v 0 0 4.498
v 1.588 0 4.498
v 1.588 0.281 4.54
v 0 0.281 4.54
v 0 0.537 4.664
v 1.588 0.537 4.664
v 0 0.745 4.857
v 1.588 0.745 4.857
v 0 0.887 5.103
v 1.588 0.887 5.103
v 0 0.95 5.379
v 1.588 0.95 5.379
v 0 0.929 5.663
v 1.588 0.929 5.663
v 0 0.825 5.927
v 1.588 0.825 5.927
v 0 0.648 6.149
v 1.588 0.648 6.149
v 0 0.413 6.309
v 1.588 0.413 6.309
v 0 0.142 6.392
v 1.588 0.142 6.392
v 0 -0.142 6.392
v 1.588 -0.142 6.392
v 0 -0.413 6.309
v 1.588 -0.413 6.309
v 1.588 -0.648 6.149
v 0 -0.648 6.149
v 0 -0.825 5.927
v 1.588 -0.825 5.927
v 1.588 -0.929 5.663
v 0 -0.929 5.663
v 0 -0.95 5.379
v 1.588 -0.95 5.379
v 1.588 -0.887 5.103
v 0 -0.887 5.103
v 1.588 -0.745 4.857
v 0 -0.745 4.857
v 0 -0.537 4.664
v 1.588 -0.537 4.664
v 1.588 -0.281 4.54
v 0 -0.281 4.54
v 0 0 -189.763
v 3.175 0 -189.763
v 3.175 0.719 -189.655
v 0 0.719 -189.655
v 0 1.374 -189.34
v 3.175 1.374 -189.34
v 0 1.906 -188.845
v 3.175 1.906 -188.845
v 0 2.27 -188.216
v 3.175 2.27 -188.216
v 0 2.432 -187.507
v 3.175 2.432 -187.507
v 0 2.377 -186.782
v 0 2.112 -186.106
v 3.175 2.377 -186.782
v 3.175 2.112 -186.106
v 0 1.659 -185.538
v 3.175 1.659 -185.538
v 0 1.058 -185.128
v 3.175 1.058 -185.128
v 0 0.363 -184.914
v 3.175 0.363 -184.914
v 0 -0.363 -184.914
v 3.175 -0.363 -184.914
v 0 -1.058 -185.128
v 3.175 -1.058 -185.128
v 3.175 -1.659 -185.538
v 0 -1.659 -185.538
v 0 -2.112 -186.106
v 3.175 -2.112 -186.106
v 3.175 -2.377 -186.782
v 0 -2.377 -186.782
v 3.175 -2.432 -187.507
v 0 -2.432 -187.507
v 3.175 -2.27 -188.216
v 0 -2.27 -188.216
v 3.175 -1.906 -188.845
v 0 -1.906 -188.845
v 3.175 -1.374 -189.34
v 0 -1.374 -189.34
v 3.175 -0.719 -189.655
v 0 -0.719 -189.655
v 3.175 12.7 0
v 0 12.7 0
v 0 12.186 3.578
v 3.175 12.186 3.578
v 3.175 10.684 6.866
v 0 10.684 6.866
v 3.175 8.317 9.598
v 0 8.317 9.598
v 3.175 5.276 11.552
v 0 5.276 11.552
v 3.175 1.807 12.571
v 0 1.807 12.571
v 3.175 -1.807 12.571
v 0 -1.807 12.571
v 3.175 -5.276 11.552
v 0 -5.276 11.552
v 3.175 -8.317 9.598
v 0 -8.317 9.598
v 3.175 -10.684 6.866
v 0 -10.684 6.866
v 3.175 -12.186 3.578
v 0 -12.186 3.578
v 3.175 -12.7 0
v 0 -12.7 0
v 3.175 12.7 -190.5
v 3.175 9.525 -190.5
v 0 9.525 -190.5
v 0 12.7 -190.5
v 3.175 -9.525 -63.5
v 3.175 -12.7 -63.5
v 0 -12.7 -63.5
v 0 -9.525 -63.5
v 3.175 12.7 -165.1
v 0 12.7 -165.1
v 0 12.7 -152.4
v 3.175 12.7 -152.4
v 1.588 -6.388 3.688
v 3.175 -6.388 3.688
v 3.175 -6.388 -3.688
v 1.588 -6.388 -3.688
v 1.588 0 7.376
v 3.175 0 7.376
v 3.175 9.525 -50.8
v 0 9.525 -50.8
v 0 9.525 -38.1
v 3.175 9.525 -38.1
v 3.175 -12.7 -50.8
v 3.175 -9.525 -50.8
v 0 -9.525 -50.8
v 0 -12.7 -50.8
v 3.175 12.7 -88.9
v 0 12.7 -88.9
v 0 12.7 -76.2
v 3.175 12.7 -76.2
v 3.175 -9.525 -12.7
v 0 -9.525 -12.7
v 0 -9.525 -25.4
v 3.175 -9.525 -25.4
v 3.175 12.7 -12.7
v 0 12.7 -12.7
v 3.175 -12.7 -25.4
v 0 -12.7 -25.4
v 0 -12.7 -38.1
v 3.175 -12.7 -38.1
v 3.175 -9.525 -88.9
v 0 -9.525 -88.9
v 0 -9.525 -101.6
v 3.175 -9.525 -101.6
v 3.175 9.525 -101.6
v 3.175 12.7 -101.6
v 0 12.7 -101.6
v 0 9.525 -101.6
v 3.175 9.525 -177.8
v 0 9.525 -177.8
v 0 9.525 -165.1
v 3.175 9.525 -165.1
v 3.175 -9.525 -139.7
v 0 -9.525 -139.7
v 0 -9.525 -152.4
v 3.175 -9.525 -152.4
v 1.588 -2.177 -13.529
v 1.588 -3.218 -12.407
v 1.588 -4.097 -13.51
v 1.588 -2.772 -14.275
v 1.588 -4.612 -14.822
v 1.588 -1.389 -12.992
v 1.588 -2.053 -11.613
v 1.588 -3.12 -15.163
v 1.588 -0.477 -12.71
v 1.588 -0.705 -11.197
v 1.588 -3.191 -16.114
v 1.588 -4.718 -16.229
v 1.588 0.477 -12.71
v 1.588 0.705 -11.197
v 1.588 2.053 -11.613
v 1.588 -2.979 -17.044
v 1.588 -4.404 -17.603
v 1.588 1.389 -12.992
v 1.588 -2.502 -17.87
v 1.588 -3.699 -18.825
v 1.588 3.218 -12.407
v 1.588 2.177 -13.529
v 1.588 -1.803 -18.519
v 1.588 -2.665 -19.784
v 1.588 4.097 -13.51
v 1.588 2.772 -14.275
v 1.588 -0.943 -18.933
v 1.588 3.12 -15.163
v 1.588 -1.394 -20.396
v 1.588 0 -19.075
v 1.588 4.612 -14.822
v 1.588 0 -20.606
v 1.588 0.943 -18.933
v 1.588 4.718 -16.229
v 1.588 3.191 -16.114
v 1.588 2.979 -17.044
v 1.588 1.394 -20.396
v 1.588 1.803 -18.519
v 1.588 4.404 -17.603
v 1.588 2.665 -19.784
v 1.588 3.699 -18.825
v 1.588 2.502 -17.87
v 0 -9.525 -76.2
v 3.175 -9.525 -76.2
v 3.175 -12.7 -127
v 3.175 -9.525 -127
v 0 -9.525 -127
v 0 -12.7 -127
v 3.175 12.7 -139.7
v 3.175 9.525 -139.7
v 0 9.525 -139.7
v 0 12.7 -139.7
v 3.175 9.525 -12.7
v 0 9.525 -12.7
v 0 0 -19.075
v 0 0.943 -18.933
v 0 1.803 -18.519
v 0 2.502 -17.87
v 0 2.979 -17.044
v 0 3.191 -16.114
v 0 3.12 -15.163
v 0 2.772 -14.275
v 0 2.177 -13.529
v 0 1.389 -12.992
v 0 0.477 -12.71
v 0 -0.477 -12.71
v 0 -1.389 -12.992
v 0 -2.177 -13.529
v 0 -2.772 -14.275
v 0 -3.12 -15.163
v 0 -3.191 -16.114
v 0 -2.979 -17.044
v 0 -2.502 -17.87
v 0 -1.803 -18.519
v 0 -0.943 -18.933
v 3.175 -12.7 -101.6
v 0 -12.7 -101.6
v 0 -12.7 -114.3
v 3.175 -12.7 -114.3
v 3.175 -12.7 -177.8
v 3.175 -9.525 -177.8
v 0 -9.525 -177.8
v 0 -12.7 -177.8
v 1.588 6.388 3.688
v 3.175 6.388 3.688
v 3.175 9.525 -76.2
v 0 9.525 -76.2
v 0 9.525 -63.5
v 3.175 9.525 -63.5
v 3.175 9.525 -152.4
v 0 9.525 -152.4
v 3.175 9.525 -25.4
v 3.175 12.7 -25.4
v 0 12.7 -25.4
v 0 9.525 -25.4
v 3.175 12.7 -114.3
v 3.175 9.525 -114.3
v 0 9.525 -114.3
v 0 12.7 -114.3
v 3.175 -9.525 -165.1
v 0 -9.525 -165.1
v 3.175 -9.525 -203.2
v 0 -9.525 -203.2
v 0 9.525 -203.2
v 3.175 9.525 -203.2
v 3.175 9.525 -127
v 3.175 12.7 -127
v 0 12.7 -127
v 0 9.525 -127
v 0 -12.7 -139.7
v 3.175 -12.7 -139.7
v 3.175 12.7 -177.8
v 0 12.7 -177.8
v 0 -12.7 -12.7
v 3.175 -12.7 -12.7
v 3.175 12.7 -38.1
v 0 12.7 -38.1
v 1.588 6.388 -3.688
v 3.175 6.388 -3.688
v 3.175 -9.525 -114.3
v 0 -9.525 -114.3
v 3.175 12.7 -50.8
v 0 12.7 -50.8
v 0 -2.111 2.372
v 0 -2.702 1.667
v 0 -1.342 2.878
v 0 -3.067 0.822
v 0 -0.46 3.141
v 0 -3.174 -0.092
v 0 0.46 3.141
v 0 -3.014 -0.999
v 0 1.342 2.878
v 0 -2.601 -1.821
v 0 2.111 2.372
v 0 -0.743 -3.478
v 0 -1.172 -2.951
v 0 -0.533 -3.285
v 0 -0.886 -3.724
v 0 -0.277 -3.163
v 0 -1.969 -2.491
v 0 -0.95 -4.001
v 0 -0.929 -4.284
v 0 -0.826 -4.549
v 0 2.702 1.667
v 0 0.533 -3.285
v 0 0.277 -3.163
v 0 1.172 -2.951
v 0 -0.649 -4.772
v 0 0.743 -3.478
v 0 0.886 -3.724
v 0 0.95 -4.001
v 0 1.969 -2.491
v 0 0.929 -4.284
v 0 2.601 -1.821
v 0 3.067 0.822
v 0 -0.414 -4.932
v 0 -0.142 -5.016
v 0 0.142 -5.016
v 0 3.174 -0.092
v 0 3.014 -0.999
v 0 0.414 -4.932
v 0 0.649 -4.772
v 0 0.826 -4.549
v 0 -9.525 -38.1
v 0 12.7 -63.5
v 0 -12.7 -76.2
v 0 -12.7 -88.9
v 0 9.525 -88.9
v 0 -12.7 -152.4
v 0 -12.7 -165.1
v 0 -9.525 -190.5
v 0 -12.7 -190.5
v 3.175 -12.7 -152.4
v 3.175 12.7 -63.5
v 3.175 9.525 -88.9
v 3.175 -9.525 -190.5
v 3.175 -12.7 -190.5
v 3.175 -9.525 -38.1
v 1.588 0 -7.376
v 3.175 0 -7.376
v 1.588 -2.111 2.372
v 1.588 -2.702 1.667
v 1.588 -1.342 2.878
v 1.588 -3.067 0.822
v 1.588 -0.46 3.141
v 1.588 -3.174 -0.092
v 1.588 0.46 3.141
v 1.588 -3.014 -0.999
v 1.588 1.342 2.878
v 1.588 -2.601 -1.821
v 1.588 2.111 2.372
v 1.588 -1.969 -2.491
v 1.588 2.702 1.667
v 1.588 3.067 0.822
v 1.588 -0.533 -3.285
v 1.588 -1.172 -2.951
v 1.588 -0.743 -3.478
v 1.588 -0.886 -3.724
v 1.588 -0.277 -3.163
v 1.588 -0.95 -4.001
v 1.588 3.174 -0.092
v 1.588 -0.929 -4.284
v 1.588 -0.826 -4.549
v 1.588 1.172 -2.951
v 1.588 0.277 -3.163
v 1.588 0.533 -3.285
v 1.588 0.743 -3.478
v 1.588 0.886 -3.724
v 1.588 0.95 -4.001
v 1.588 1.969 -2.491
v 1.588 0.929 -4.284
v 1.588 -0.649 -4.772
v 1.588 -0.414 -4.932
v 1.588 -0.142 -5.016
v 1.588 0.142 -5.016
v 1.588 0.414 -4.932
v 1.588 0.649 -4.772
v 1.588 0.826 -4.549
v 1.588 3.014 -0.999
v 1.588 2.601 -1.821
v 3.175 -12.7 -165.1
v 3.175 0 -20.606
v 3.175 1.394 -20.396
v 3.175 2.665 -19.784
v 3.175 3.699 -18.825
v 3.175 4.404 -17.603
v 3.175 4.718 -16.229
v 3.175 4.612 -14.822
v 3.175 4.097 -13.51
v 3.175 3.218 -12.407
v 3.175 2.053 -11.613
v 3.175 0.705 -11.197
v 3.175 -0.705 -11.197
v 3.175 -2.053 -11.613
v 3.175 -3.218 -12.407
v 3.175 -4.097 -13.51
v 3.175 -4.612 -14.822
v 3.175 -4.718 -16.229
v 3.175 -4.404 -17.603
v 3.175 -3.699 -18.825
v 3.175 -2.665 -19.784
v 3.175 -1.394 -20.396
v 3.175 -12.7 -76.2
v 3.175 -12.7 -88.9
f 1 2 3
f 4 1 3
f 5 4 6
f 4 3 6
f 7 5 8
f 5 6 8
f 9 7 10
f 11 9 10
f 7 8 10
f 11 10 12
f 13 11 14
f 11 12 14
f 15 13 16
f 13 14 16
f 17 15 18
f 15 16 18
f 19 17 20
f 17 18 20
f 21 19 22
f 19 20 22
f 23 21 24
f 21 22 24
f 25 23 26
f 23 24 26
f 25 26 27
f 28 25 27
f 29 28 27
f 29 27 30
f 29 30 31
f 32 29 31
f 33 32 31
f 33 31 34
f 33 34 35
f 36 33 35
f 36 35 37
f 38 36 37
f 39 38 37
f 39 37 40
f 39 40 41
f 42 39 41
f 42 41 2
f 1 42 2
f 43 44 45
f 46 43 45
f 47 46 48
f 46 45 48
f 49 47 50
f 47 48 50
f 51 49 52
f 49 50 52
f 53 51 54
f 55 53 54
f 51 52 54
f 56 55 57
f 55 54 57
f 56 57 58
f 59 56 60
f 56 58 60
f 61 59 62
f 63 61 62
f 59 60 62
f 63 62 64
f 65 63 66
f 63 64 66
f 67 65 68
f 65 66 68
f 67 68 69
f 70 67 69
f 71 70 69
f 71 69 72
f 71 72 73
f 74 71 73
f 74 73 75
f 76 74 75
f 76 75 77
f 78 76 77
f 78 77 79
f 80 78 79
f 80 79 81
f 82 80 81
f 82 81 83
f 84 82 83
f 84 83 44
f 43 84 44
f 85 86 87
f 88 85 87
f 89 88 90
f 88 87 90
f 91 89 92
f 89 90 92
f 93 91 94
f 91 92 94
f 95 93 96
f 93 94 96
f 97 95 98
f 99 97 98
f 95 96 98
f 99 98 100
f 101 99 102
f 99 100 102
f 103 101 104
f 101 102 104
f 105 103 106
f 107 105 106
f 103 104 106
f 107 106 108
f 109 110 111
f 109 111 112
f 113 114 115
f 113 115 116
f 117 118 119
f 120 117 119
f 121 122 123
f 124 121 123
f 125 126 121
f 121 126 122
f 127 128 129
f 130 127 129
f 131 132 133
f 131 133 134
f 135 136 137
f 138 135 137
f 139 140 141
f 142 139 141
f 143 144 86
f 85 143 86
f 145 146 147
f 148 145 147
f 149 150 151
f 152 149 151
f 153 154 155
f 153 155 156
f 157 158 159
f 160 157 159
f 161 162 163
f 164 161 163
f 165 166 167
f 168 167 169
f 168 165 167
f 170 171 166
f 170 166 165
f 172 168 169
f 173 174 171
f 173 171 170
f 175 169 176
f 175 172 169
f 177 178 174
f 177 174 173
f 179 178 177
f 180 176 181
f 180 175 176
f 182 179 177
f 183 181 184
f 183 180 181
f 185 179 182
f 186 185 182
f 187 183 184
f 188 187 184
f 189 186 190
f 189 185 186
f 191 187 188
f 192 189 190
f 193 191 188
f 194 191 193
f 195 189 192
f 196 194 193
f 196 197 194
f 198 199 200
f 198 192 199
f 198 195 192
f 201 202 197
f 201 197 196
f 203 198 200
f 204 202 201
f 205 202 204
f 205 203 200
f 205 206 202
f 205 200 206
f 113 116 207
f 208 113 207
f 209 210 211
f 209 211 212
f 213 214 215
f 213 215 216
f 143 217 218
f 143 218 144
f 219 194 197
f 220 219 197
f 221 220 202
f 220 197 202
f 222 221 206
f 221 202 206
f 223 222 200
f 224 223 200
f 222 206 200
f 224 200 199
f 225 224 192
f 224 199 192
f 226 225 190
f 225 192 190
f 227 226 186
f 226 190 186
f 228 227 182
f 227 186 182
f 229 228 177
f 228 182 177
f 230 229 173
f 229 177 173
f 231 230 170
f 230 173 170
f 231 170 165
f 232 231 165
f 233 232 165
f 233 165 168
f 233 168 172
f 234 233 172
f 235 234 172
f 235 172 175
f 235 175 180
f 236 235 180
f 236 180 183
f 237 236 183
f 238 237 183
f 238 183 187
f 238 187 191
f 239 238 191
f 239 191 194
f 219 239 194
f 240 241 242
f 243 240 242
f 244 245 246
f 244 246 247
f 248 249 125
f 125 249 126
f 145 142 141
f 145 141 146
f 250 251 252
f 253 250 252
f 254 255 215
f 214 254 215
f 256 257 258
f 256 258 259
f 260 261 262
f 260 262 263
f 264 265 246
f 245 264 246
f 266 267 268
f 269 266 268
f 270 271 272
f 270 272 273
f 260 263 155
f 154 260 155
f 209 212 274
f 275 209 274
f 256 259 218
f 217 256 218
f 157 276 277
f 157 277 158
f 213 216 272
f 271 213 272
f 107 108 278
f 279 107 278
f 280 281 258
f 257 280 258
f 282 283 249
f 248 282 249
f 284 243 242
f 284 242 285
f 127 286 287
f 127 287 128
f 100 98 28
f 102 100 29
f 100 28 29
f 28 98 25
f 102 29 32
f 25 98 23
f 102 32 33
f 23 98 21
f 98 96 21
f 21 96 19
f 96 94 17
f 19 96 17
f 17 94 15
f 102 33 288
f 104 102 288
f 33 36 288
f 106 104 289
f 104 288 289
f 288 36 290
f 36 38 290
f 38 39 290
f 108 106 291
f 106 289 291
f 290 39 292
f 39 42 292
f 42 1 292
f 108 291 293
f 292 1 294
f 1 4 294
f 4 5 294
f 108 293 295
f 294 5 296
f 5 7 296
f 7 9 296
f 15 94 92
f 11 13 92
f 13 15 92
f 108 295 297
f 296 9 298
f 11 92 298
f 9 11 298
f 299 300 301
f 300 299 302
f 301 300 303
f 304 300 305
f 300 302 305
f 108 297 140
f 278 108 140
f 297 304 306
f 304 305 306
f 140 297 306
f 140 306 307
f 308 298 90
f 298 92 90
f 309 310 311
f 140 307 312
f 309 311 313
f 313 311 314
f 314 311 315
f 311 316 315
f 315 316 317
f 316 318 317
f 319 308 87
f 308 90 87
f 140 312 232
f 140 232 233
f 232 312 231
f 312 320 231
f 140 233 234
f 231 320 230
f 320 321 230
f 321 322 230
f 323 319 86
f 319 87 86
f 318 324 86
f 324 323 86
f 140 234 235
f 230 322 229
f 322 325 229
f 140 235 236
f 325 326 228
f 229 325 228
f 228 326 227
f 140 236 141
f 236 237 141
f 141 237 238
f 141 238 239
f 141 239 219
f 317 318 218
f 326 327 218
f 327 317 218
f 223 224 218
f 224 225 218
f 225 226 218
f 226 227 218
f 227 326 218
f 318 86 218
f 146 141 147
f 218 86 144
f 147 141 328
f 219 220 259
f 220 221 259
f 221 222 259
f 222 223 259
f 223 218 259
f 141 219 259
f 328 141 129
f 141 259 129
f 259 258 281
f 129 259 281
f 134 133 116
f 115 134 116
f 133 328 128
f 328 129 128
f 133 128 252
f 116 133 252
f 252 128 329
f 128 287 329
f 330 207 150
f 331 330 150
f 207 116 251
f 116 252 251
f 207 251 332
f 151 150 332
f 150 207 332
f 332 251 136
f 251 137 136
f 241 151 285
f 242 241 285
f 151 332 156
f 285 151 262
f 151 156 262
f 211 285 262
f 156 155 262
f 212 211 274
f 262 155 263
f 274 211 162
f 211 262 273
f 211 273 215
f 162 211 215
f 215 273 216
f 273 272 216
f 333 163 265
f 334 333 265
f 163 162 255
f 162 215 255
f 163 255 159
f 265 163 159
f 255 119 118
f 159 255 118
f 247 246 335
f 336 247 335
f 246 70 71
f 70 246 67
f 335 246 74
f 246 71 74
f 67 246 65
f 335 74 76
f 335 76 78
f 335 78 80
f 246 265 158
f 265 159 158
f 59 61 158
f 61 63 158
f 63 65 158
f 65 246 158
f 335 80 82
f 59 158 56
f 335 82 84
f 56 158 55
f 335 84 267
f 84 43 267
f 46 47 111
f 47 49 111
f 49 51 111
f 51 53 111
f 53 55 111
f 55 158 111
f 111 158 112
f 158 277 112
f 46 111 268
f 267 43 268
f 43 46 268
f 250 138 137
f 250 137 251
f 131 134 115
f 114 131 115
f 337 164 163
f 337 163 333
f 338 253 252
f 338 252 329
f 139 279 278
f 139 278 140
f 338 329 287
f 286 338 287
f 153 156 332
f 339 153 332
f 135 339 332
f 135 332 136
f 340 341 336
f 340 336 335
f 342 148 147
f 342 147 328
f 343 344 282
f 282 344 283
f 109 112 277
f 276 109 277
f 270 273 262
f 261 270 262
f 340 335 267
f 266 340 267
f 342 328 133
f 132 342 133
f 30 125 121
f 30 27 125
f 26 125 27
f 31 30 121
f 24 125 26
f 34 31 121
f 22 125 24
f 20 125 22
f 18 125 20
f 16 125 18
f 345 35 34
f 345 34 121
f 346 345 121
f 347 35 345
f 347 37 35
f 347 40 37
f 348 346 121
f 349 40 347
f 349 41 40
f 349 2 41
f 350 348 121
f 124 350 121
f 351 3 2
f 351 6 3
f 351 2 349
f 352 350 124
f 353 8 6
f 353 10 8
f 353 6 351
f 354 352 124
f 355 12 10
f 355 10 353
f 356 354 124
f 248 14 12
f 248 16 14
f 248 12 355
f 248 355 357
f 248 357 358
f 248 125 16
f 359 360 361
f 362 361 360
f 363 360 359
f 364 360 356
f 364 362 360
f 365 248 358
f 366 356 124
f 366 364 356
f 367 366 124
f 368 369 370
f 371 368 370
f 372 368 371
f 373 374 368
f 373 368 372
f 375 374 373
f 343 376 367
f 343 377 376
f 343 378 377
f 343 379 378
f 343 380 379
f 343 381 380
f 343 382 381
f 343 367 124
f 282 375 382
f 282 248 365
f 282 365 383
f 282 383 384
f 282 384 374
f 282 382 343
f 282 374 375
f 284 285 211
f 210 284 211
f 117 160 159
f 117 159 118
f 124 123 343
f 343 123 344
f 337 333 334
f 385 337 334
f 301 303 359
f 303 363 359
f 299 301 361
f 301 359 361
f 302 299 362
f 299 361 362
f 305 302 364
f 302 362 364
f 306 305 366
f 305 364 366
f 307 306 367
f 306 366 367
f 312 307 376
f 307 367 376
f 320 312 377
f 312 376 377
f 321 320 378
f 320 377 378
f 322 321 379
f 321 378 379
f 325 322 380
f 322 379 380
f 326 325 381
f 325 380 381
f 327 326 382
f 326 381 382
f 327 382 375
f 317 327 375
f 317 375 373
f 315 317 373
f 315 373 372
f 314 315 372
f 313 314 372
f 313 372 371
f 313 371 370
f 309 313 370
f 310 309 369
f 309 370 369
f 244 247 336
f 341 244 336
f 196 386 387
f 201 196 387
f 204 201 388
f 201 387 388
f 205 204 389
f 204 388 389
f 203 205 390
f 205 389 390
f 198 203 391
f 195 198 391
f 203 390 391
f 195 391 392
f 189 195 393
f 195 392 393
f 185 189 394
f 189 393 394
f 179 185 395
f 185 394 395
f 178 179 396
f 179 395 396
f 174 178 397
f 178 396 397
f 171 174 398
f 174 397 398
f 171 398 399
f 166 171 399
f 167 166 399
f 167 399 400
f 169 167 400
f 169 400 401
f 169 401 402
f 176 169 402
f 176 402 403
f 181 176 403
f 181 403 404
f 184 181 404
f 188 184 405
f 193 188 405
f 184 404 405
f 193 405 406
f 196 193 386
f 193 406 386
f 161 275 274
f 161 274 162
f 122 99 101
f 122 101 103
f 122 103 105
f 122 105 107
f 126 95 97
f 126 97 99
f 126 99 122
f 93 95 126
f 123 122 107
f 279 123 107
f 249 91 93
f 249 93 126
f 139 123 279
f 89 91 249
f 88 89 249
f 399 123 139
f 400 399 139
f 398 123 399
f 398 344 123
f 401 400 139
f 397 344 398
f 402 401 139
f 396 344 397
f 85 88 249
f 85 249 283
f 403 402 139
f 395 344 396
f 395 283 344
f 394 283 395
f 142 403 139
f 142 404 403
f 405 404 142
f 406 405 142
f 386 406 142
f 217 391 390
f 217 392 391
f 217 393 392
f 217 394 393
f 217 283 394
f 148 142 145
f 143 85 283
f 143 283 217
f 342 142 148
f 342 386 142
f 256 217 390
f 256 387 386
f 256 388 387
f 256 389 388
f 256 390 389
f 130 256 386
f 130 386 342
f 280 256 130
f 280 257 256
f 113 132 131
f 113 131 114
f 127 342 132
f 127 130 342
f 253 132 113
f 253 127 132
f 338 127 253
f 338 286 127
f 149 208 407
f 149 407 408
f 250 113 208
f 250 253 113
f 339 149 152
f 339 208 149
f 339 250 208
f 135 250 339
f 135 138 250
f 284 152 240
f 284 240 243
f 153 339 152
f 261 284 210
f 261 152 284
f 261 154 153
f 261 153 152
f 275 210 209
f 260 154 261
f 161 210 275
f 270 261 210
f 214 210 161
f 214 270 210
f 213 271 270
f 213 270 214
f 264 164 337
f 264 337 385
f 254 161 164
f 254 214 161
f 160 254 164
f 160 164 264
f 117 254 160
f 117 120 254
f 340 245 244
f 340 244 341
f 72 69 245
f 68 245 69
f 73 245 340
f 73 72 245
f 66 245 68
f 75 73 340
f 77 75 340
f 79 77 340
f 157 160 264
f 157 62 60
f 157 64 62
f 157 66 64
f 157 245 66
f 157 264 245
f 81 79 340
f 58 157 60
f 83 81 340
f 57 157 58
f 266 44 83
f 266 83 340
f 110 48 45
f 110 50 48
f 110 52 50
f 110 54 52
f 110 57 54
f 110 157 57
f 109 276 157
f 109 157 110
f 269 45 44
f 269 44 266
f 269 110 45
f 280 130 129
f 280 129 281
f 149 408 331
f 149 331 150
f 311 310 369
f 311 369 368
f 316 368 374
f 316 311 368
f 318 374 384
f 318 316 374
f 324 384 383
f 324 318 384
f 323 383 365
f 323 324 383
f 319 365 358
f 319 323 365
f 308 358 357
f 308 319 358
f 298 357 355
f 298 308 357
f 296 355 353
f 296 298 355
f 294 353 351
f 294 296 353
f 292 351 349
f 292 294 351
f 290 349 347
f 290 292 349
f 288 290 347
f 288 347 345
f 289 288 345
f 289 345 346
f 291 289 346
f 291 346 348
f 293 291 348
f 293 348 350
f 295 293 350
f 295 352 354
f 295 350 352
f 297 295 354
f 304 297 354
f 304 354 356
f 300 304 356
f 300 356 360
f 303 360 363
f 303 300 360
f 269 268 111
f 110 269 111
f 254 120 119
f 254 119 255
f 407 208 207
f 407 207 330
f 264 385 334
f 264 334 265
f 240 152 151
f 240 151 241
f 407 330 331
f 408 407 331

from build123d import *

# Parameters (mm, degrees)
SKETCH1_R           = 3.175
BOSS_EXTRUDE1_DEPTH = 3.175
SKETCH2_R           = 3.2004
SKETCH2_R_2         = 2.4384
CUT_EXTRUDE2_DEPTH  = 204.621243059
SKETCH3_R           = 4.73075
CUT_EXTRUDE3_DEPTH  = 1.5875
SKETCH5_R           = 0.9525
CUT_EXTRUDE4_DEPTH  = 204.621243059


with BuildPart() as part:
    # Sketch1 → Boss-Extrude1 (new body)
    with BuildSketch(Plane(origin=(0, 0, 0), x_dir=(0, 0, -1), z_dir=(1, 0, 0))):
        with BuildLine():
            Line((12.7, 12.7), (0, 12.7))
            ThreePointArc((0, 12.7), (-12.7, 0), (0, -12.7))
            Line((0, -12.7), (12.7, -12.7))
            Line((12.7, -12.7), (12.7, -9.525))
            Line((12.7, -9.525), (25.4, -9.525))
            Line((25.4, -9.525), (25.4, -12.7))
            Line((25.4, -12.7), (38.1, -12.7))
            Line((38.1, -12.7), (38.1, -9.525))
            Line((38.1, -9.525), (50.8, -9.525))
            Line((50.8, -9.525), (50.8, -12.7))
            Line((50.8, -12.7), (63.5, -12.7))
            Line((63.5, -12.7), (63.5, -9.525))
            Line((63.5, -9.525), (76.2, -9.525))
            Line((76.2, -9.525), (76.2, -12.7))
            Line((76.2, -12.7), (88.9, -12.7))
            Line((88.9, -12.7), (88.9, -9.525))
            Line((88.9, -9.525), (101.6, -9.525))
            Line((101.6, -9.525), (101.6, -12.7))
            Line((101.6, -12.7), (114.3, -12.7))
            Line((114.3, -12.7), (114.3, -9.525))
            Line((114.3, -9.525), (127, -9.525))
            Line((127, -9.525), (127, -12.7))
            Line((127, -12.7), (139.7, -12.7))
            Line((139.7, -12.7), (139.7, -9.525))
            Line((139.7, -9.525), (152.4, -9.525))
            Line((152.4, -9.525), (152.4, -12.7))
            Line((152.4, -12.7), (165.1, -12.7))
            Line((165.1, -12.7), (165.1, -9.525))
            Line((165.1, -9.525), (177.8, -9.525))
            Line((177.8, -9.525), (177.8, -12.7))
            Line((177.8, -12.7), (190.5, -12.7))
            Line((190.5, -12.7), (190.5, -9.525))
            Line((190.5, -9.525), (203.2, -9.525))
            Line((203.2, -9.525), (203.2, 9.525))
            Line((203.2, 9.525), (190.5, 9.525))
            Line((190.5, 9.525), (190.5, 12.7))
            Line((190.5, 12.7), (177.8, 12.7))
            Line((177.8, 12.7), (177.8, 9.525))
            Line((177.8, 9.525), (165.1, 9.525))
            Line((165.1, 9.525), (165.1, 12.7))
            Line((165.1, 12.7), (152.4, 12.7))
            Line((152.4, 12.7), (152.4, 9.525))
            Line((152.4, 9.525), (139.7, 9.525))
            Line((139.7, 9.525), (139.7, 12.7))
            Line((139.7, 12.7), (127, 12.7))
            Line((127, 12.7), (127, 9.525))
            Line((127, 9.525), (114.3, 9.525))
            Line((114.3, 9.525), (114.3, 12.7))
            Line((114.3, 12.7), (101.6, 12.7))
            Line((101.6, 12.7), (101.6, 9.525))
            Line((101.6, 9.525), (88.9, 9.525))
            Line((88.9, 9.525), (88.9, 12.7))
            Line((88.9, 12.7), (76.2, 12.7))
            Line((76.2, 12.7), (76.2, 9.525))
            Line((76.2, 9.525), (63.5, 9.525))
            Line((63.5, 9.525), (63.5, 12.7))
            Line((63.5, 12.7), (50.8, 12.7))
            Line((50.8, 12.7), (50.8, 9.525))
            Line((50.8, 9.525), (38.1, 9.525))
            Line((38.1, 9.525), (38.1, 12.7))
            Line((38.1, 12.7), (25.4, 12.7))
            Line((25.4, 12.7), (25.4, 9.525))
            Line((25.4, 9.525), (12.7, 9.525))
            Line((12.7, 9.525), (12.7, 12.7))
        make_face()
        Circle(SKETCH1_R, mode=Mode.SUBTRACT)
    extrude(amount=BOSS_EXTRUDE1_DEPTH)

    # Sketch2 → Cut-Extrude2 (cut, through all)
    with BuildSketch(Plane(origin=(3.175, 0, 0), x_dir=(0, 0, -1), z_dir=(1, 0, 0))):
        with Locations((15.875, 0)):
            Circle(SKETCH2_R)
        with Locations((187.325, 0)):
            Circle(SKETCH2_R_2)
    extrude(amount=-CUT_EXTRUDE2_DEPTH, mode=Mode.SUBTRACT)

    # Sketch3 → Cut-Extrude3 (cut)
    with BuildSketch(Plane(origin=(3.175, 0, 0), x_dir=(0, 0, -1), z_dir=(1, 0, 0))):
        with Locations((15.875, 0)):
            Circle(SKETCH3_R)
        Polygon((3.688171255, -6.3881), (7.376342509, 0), (3.688171255, 6.3881), (-3.688171255, 6.3881), (-7.376342509, 0), (-3.688171255, -6.3881), align=None)
    extrude(amount=-CUT_EXTRUDE3_DEPTH, mode=Mode.SUBTRACT)

    # Sketch5 → Cut-Extrude4 (cut, through all)
    with BuildSketch(Plane(origin=(3.175, 0, 0), x_dir=(0, 0, -1), z_dir=(1, 0, 0))):
        with Locations((-5.450627375, 0)):
            Circle(SKETCH5_R)
        with Locations((4.074372625, 0)):
            Circle(SKETCH5_R)
    extrude(amount=-CUT_EXTRUDE4_DEPTH, mode=Mode.SUBTRACT)


solid = part.part
